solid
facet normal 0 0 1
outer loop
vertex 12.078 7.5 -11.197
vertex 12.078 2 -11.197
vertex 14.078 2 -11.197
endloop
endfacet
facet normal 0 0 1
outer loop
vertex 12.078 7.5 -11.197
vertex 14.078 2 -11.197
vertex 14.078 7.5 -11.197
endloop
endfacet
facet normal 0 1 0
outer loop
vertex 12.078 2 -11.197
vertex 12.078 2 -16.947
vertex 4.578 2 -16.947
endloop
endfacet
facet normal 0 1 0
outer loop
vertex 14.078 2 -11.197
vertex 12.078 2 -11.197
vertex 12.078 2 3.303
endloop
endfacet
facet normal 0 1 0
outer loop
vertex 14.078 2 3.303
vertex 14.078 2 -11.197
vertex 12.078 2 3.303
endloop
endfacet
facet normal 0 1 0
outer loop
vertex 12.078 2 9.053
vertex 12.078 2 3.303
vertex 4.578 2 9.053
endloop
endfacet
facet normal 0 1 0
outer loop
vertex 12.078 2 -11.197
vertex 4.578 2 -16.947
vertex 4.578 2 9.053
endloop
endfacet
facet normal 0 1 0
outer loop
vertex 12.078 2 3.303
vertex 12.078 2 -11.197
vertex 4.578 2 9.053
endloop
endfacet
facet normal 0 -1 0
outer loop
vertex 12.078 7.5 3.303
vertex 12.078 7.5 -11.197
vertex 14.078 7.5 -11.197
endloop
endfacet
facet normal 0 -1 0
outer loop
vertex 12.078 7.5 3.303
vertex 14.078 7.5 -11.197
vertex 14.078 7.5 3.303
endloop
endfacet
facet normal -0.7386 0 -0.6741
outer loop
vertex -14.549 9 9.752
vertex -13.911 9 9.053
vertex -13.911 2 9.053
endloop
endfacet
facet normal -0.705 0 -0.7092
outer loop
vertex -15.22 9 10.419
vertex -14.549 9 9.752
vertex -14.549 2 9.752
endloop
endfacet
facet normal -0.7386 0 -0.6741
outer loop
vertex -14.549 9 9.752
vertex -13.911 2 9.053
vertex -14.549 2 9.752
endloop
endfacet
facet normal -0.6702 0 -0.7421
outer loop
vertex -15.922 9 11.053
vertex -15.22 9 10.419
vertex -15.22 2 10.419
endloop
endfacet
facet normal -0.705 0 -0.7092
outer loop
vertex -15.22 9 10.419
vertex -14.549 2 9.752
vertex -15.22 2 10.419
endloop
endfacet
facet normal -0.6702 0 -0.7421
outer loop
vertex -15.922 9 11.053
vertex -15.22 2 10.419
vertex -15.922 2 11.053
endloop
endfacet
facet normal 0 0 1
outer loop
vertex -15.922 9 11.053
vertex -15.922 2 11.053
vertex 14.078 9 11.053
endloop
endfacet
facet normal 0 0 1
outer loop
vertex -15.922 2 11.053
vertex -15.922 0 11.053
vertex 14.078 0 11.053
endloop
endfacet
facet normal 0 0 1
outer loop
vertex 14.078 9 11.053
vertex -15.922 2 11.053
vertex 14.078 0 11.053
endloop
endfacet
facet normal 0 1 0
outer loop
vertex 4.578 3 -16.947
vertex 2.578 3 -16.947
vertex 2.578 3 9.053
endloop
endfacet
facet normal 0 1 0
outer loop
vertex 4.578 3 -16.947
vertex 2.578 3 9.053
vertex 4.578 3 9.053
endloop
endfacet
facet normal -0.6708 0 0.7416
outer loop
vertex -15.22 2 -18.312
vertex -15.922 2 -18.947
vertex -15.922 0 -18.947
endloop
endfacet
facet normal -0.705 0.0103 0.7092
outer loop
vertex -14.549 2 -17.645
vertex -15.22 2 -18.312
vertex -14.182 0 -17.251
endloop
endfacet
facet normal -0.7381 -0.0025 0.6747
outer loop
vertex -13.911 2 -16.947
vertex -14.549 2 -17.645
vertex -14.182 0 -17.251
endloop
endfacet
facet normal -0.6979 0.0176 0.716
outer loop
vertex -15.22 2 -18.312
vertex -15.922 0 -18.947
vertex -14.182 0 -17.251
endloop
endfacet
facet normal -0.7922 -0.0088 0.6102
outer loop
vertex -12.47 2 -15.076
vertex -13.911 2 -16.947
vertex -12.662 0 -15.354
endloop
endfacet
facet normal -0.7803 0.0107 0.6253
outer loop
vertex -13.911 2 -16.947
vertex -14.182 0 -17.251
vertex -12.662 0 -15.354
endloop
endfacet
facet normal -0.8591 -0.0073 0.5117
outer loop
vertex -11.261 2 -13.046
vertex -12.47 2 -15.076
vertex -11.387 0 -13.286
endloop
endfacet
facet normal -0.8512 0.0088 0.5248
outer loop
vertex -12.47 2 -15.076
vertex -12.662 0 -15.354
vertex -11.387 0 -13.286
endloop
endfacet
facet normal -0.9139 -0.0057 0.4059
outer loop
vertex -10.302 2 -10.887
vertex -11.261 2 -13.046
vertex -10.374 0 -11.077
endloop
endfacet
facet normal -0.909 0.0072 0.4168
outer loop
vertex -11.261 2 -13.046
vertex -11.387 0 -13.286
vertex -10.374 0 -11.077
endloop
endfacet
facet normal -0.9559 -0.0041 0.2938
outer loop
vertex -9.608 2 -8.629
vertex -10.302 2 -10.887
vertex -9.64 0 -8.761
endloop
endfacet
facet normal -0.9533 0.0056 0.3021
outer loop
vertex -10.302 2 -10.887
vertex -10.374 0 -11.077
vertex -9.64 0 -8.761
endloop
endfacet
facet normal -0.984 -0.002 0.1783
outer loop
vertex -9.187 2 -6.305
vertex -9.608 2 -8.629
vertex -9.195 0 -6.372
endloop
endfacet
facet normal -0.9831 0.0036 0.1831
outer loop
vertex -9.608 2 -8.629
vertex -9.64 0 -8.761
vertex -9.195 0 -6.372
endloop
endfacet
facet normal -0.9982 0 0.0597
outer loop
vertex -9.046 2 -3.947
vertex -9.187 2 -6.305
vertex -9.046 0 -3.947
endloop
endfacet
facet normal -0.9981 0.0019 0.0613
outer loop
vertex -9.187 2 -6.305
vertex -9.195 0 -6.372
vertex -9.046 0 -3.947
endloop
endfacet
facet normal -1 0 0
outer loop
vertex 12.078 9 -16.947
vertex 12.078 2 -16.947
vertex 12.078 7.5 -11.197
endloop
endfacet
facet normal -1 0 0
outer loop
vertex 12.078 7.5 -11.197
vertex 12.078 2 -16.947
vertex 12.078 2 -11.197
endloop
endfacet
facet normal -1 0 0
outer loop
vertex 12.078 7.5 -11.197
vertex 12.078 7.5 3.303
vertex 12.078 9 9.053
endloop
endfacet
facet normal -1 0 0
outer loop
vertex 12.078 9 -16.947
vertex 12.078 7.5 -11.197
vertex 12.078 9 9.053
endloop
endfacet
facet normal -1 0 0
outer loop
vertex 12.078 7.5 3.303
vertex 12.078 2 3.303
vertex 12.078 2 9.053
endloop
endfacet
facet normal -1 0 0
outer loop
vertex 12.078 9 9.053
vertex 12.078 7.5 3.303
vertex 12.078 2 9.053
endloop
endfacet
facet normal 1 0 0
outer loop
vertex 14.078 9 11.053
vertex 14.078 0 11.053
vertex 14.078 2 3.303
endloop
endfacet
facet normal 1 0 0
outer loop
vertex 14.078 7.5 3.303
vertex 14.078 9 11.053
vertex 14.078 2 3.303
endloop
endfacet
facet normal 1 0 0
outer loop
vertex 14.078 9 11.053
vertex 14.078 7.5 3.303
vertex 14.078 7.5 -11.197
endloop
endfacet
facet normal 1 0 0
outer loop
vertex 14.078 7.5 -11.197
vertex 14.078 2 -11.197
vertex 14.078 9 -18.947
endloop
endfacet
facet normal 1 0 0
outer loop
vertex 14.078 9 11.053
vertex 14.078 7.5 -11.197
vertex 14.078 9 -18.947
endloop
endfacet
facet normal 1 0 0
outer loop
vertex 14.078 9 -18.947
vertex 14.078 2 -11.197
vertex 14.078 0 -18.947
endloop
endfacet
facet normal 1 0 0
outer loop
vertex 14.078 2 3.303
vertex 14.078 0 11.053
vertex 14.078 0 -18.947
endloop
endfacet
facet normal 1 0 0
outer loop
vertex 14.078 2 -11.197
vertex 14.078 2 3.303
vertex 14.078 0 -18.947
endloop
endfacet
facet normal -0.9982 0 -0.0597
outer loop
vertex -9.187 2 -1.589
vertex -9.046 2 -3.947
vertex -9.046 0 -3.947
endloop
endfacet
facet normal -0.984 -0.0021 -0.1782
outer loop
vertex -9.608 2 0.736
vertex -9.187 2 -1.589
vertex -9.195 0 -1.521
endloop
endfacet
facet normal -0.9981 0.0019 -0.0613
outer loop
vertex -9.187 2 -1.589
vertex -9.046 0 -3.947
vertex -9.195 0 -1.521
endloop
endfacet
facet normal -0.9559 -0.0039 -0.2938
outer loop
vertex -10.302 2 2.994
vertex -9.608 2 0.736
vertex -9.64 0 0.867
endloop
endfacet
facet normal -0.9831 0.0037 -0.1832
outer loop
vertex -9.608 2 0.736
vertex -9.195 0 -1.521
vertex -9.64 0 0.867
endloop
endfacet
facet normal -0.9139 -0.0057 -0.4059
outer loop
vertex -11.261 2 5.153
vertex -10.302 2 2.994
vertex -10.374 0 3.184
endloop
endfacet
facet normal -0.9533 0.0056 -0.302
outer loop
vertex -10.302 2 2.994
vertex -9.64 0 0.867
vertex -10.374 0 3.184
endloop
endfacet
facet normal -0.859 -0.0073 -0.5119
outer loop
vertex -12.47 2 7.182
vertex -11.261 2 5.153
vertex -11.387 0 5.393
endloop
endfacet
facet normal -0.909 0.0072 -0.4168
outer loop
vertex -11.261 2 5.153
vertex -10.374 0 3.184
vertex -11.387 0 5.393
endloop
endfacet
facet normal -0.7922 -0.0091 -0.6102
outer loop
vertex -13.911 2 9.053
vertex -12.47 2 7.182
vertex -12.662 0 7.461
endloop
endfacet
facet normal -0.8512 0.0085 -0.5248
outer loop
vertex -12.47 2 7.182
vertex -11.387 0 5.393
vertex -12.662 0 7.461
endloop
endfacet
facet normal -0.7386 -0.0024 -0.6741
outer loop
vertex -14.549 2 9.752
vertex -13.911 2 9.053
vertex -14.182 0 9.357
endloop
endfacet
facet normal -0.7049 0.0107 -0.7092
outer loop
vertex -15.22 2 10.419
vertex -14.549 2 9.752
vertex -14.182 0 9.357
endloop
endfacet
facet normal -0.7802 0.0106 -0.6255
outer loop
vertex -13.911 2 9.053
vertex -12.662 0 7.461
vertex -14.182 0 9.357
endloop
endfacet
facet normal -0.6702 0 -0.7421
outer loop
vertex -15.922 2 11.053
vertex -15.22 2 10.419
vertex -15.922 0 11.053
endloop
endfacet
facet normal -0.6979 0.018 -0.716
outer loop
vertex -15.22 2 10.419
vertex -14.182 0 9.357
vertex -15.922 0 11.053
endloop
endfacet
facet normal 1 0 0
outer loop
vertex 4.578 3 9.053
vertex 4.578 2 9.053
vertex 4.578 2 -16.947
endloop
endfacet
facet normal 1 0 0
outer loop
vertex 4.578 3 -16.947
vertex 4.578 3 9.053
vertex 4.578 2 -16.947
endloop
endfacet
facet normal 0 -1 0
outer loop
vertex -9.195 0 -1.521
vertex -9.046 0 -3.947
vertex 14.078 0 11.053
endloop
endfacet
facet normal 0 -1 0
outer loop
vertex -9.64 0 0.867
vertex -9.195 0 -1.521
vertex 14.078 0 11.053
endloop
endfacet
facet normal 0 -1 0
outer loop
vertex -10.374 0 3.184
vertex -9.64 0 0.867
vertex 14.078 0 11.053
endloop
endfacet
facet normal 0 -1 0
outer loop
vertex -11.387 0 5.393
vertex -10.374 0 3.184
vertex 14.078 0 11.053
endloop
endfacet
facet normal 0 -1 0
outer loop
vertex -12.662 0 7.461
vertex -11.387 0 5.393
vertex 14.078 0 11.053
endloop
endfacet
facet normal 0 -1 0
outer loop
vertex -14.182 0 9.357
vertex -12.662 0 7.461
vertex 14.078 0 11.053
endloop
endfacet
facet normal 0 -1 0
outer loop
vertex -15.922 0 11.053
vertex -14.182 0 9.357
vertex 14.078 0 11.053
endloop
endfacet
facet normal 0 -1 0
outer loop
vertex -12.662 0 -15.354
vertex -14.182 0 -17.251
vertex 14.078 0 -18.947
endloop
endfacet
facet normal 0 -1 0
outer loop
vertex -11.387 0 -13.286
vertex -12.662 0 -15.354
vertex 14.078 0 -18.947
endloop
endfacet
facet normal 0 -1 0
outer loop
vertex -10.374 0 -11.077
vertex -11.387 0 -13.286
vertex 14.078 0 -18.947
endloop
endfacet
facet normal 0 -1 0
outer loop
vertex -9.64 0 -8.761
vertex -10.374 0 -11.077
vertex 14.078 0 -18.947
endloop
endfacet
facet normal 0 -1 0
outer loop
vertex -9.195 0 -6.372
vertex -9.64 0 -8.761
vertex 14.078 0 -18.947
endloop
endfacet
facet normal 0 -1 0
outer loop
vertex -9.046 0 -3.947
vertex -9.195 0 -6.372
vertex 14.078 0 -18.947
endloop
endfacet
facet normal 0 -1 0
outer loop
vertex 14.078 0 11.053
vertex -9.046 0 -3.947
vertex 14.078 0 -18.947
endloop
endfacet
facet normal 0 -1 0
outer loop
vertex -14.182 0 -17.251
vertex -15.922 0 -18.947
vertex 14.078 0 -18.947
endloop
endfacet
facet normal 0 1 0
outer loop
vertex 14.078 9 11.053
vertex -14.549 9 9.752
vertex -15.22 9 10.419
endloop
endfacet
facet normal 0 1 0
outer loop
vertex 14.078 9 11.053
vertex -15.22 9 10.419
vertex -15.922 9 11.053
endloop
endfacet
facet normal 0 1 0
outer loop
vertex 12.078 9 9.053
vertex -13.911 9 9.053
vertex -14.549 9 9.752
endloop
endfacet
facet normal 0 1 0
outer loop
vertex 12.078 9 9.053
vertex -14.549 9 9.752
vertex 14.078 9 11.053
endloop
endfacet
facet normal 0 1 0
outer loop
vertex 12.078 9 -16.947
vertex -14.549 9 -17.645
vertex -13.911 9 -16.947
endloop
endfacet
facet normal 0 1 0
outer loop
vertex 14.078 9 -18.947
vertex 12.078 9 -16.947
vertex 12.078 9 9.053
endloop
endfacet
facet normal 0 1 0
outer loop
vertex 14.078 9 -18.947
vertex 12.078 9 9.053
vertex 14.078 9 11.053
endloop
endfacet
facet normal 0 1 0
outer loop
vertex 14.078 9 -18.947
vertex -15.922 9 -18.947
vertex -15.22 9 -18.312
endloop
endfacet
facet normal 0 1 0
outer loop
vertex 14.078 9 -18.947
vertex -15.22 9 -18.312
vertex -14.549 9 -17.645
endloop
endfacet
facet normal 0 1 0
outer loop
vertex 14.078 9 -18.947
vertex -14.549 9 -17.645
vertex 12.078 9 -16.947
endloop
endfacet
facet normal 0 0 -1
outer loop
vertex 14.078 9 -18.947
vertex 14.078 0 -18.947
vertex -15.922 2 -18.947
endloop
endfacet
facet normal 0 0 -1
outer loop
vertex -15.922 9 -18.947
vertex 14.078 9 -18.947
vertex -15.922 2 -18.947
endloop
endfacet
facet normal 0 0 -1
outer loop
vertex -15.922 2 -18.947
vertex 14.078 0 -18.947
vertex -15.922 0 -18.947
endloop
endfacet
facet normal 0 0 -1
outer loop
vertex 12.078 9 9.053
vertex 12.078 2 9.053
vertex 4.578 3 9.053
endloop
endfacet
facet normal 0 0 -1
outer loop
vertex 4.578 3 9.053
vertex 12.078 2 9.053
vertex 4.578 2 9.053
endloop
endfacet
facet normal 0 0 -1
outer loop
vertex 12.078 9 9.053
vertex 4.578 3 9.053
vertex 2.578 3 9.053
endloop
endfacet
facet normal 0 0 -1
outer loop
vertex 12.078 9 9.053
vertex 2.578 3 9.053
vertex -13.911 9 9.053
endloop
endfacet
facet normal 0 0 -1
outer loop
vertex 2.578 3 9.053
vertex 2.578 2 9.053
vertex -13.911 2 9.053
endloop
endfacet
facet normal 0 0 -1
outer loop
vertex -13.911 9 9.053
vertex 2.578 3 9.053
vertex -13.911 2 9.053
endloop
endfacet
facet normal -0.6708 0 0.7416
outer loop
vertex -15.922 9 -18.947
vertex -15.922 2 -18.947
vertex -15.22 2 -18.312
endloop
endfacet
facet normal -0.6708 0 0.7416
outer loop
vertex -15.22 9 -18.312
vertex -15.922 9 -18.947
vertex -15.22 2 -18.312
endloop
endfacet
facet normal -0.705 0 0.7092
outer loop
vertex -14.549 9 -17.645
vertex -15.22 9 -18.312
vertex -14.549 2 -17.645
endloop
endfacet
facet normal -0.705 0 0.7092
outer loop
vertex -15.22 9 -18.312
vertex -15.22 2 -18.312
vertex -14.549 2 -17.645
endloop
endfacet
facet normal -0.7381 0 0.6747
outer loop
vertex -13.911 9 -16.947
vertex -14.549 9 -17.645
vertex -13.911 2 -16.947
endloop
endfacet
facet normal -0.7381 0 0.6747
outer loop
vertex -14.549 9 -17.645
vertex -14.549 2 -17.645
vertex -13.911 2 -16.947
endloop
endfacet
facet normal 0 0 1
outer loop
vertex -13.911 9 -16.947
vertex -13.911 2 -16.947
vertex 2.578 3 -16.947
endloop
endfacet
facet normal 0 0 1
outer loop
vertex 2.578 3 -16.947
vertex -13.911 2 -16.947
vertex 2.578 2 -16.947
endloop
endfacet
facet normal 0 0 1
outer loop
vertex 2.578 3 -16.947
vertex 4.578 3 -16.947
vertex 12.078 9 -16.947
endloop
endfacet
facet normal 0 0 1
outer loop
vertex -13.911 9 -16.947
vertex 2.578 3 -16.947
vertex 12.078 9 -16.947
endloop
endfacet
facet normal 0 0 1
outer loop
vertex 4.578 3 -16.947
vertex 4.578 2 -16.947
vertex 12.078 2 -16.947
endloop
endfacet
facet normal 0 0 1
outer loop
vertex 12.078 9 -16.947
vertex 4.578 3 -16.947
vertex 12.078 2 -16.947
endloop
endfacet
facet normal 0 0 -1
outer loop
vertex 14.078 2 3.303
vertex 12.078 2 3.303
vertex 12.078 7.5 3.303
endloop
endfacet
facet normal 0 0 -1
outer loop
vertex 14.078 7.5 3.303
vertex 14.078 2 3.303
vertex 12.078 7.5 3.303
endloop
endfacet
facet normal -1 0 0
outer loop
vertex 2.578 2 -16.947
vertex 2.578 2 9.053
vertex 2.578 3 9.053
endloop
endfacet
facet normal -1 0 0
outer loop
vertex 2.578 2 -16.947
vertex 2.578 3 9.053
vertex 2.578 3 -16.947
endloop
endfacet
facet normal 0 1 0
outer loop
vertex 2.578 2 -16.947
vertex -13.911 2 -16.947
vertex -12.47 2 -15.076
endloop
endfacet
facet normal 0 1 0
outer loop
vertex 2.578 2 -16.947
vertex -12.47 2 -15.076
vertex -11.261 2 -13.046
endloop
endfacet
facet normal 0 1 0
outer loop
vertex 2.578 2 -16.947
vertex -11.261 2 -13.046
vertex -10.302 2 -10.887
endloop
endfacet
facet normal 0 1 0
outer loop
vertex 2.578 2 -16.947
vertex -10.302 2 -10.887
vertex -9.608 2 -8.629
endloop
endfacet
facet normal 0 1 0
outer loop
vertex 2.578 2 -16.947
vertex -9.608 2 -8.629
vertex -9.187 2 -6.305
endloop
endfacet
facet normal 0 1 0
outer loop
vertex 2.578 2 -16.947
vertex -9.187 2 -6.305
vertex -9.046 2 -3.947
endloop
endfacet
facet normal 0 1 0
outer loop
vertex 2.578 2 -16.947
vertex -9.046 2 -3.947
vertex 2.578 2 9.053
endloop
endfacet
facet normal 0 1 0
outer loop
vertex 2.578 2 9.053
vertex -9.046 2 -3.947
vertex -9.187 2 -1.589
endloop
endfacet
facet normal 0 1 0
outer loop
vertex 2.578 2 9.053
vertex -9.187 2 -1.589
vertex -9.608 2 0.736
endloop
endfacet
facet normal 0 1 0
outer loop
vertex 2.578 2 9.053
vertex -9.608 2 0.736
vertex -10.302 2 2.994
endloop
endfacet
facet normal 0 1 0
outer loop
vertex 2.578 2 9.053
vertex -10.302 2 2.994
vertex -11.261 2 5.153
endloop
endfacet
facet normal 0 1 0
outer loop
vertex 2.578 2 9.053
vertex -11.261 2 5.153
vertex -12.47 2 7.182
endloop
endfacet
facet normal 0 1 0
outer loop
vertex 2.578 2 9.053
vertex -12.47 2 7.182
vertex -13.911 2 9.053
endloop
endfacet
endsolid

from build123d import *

# Parameters (mm, degrees)
EXTRUDE_1_DEPTH     = 2
EXTRUDE_2_DEPTH     = 7
SKETCH_3_W          = 14.5
SKETCH_3_H          = 5.5
CUT_EXTRUDE_1_DEPTH = 2
SKETCH_4_W          = 2
SKETCH_4_H          = 26
EXTRUDE_3_DEPTH     = 1


with BuildPart() as part:
    # 草图1 → 凸台-拉伸1 (new body)
    with BuildSketch(Plane(origin=(0, 0, 0), x_dir=(1, 0, 0), z_dir=(0, 1, 0))):
        with BuildLine():
            Line((14.078397583, 18.946730462), (-15.921602417, 18.946730462))
            ThreePointArc((-15.921602417, 18.946730462), (-10.846789199, 12.197093132), (-9.045997954, 3.946730462))
            ThreePointArc((-9.045997954, 3.946730462), (-10.846789199, -4.303632207), (-15.921602417, -11.053269538))
            Line((-15.921602417, -11.053269538), (14.078397583, -11.053269538))
            Line((14.078397583, -11.053269538), (14.078397583, 18.946730462))
        make_face()
    extrude(amount=EXTRUDE_1_DEPTH)

    # 草图2 → 凸台-拉伸2 (add)
    with BuildSketch(Plane(origin=(0, 2, 0), x_dir=(1, 0, 0), z_dir=(0, 1, 0))):
        with BuildLine():
            Line((14.078397583, 18.946730462), (-15.921602417, 18.946730462))
            ThreePointArc((-15.921602417, 18.946730462), (-14.880689288, 17.982761022), (-13.911474192, 16.946730462))
            Line((-13.911474192, 16.946730462), (12.078397583, 16.946730462))
            Line((12.078397583, 16.946730462), (12.078397583, -9.053269538))
            Line((12.078397583, -9.053269538), (-13.911474192, -9.053269538))
            ThreePointArc((-13.911474192, -9.053269538), (-14.880689288, -10.089300097), (-15.921602417, -11.053269538))
            Line((-15.921602417, -11.053269538), (14.078397583, -11.053269538))
            Line((14.078397583, -11.053269538), (14.078397583, 18.946730462))
        make_face()
    extrude(amount=EXTRUDE_2_DEPTH)

    # 草图3 → 切除-拉伸1 (cut)
    with BuildSketch(Plane.ZY.offset(-12.078397583)):
        with Locations((-3.946730462, 4.75)):
            Rectangle(SKETCH_3_W, SKETCH_3_H)
    extrude(amount=-CUT_EXTRUDE_1_DEPTH, mode=Mode.SUBTRACT)

    # 草图4 → 凸台-拉伸3 (add)
    with BuildSketch(Plane(origin=(0, 2, 0), x_dir=(1, 0, 0), z_dir=(0, 1, 0))):
        with Locations((3.578397583, 3.946730462)):
            Rectangle(SKETCH_4_W, SKETCH_4_H)
    extrude(amount=EXTRUDE_3_DEPTH)


solid = part.part
